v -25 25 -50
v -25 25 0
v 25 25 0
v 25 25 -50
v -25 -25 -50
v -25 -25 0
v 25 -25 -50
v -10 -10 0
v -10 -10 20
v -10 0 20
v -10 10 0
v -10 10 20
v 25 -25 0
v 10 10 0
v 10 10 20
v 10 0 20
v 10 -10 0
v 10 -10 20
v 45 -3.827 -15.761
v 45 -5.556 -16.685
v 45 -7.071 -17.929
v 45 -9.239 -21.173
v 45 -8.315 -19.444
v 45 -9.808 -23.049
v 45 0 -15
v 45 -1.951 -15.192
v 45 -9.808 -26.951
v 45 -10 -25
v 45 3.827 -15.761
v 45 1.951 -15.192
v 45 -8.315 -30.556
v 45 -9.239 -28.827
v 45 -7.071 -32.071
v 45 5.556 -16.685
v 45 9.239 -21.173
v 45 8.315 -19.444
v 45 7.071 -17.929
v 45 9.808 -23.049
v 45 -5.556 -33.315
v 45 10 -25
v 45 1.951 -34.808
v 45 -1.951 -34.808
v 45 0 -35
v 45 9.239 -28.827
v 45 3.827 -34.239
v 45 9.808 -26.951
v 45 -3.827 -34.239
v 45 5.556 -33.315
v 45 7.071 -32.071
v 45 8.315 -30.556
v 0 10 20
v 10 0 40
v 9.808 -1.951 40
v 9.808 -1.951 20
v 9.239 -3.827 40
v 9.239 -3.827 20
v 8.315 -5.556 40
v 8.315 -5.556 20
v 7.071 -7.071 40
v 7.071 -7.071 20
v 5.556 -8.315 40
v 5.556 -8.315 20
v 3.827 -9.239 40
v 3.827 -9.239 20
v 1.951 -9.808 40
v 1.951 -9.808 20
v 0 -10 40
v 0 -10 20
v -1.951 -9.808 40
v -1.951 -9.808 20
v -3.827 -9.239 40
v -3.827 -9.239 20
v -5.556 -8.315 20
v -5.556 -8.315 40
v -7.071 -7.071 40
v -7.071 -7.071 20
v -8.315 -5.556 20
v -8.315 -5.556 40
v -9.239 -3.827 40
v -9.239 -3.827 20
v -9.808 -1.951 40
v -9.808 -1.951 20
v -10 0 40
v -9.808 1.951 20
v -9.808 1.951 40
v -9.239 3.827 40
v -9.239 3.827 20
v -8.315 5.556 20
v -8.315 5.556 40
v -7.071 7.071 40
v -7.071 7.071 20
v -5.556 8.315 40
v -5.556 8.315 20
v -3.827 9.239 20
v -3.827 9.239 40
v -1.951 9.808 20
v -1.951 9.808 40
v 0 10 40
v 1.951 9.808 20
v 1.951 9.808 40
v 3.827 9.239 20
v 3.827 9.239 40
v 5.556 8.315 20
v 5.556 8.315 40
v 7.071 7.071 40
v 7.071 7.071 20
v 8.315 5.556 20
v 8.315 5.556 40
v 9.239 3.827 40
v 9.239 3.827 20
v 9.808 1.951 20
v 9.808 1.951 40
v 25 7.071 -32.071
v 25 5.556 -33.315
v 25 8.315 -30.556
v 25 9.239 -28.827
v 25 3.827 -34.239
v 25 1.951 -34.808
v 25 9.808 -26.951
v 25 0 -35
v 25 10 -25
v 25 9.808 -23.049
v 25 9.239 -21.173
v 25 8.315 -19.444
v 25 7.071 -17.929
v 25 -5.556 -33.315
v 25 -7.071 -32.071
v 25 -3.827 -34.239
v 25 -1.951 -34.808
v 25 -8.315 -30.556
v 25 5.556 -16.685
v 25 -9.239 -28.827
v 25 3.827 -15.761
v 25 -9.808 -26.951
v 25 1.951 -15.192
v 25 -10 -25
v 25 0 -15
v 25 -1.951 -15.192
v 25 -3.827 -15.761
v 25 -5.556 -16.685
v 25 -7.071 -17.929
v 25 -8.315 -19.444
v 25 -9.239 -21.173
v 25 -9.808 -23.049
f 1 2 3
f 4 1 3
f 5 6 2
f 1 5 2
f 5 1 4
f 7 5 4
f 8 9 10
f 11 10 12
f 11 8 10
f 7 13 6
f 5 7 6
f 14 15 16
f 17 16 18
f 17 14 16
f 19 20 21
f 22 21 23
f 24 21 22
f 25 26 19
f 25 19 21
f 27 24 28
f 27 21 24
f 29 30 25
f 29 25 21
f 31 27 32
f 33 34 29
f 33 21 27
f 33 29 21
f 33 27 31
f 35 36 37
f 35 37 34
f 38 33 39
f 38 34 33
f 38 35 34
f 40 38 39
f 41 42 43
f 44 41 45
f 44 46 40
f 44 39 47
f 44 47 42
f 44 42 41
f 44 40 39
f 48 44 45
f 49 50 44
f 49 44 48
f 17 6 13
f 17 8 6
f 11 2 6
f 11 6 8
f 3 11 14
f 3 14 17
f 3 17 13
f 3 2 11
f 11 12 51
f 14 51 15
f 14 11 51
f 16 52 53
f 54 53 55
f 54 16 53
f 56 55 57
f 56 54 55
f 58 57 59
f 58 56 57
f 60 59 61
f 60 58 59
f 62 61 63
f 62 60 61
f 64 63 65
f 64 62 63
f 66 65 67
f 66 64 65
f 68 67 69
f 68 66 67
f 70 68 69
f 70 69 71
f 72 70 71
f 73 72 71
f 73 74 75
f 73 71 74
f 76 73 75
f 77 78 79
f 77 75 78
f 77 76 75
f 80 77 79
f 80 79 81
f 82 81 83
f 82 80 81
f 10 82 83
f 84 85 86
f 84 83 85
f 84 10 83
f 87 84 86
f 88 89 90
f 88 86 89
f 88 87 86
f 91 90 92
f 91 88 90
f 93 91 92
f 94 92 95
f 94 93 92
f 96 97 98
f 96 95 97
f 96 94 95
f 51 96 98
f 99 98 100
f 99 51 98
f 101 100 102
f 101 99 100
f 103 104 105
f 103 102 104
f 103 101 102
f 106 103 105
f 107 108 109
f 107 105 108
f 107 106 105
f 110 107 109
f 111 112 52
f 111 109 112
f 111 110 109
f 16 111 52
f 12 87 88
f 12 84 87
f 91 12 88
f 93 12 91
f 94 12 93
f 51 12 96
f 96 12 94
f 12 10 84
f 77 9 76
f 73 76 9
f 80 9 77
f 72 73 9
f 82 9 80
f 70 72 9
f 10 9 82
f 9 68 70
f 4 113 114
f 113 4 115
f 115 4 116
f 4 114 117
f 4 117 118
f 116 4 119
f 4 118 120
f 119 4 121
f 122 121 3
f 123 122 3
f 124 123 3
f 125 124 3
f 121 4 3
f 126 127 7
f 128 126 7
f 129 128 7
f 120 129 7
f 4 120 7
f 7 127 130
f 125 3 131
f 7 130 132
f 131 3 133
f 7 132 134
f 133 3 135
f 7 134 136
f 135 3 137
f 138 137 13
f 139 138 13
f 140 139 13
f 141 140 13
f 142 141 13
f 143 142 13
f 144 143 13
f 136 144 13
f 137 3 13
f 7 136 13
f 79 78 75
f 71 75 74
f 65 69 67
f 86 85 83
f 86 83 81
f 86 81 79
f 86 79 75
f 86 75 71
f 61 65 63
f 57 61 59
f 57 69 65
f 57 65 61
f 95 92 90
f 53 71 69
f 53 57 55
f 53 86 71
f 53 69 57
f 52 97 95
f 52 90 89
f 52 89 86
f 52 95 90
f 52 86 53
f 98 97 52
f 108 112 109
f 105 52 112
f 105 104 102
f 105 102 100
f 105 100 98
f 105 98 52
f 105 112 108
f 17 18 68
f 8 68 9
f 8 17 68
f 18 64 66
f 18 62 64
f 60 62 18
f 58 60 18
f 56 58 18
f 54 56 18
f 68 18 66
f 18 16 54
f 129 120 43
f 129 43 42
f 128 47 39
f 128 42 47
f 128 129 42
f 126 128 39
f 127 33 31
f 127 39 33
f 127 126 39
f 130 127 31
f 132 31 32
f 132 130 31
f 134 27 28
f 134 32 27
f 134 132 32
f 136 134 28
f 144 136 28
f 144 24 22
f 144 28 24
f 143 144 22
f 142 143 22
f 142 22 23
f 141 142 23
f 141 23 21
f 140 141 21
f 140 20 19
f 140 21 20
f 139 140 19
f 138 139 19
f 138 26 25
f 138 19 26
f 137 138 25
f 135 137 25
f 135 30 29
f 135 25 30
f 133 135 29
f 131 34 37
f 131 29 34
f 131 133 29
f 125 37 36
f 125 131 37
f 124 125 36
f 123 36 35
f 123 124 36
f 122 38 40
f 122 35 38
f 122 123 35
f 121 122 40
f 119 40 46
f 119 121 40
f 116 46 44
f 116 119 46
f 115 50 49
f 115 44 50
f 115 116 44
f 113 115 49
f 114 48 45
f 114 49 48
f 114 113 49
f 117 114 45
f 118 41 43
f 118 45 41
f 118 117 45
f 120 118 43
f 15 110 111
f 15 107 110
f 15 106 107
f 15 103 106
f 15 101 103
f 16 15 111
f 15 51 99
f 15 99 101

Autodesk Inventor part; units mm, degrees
ref_plane "YZ Plane" through (0, 0, 0) normal (1, 0, 0) x (0, 1, 0)
ref_plane "XZ Plane" through (0, 0, 0) normal (0, 1, 0) x (-1, 0, 0)
ref_plane "XY Plane" through (0, 0, 0) normal (0, 0, 1) x (1, 0, 0)
sketch "Sketch1" plane through (0, 0, 0) normal (0, 0, 1) x (1, 0, 0)
  line L0 (-25, 25) -> (25, 25)
  line L1 (25, 25) -> (25, -25)
  line L2 (25, -25) -> (-25, -25)
  line L3 (-25, -25) -> (-25, 25)
  point P0 (0, 0)
  point P1 (-25, 0)
  point P2 (0, 25)
  dimension "d0" = 50
  dimension "d1" = 50
extrude "Extrusion1" add sketch "Sketch1" against normal blind 50
sketch "Sketch2" plane through (0, 0, 0) normal (0, 0, 1) x (1, 0, 0)
  line L0 (-10, 10) -> (10, 10)
  line L1 (10, 10) -> (10, -10)
  line L2 (10, -10) -> (-10, -10)
  line L3 (-10, -10) -> (-10, 10)
  point P0 (0, 0)
  point P1 (-10, 0)
  point P2 (0, 10)
  dimension "d4" = 20
  dimension "d5" = 20
extrude "Extrusion2" add sketch "Sketch2" along normal blind 20
sketch "Sketch3" plane through (0, 0, 20) normal (0, 0, 1) x (1, 0, 0)
  line L0 (10, 10) -> (10, -10) projected
  circle A0 centre (0, 0) radius 10
extrude "Extrusion3" add sketch "Sketch3" along normal blind 20
sketch "Sketch4" plane through (25, -25, 0) normal (1, 0, 0) x (0, 0, -1)
  line L0 (50, 0) -> (50, 50) projected
  line L1 (0, 50) -> (50, 50) projected
  circle A0 centre (25, 25) radius 10
  point P0 (0, 25)
  point P1 (50, 25)
  point P2 (25, 50)
  dimension "d10" = 20
extrude "Extrusion4" add sketch "Sketch4" along normal blind 20
properties part number "cubo 2"
